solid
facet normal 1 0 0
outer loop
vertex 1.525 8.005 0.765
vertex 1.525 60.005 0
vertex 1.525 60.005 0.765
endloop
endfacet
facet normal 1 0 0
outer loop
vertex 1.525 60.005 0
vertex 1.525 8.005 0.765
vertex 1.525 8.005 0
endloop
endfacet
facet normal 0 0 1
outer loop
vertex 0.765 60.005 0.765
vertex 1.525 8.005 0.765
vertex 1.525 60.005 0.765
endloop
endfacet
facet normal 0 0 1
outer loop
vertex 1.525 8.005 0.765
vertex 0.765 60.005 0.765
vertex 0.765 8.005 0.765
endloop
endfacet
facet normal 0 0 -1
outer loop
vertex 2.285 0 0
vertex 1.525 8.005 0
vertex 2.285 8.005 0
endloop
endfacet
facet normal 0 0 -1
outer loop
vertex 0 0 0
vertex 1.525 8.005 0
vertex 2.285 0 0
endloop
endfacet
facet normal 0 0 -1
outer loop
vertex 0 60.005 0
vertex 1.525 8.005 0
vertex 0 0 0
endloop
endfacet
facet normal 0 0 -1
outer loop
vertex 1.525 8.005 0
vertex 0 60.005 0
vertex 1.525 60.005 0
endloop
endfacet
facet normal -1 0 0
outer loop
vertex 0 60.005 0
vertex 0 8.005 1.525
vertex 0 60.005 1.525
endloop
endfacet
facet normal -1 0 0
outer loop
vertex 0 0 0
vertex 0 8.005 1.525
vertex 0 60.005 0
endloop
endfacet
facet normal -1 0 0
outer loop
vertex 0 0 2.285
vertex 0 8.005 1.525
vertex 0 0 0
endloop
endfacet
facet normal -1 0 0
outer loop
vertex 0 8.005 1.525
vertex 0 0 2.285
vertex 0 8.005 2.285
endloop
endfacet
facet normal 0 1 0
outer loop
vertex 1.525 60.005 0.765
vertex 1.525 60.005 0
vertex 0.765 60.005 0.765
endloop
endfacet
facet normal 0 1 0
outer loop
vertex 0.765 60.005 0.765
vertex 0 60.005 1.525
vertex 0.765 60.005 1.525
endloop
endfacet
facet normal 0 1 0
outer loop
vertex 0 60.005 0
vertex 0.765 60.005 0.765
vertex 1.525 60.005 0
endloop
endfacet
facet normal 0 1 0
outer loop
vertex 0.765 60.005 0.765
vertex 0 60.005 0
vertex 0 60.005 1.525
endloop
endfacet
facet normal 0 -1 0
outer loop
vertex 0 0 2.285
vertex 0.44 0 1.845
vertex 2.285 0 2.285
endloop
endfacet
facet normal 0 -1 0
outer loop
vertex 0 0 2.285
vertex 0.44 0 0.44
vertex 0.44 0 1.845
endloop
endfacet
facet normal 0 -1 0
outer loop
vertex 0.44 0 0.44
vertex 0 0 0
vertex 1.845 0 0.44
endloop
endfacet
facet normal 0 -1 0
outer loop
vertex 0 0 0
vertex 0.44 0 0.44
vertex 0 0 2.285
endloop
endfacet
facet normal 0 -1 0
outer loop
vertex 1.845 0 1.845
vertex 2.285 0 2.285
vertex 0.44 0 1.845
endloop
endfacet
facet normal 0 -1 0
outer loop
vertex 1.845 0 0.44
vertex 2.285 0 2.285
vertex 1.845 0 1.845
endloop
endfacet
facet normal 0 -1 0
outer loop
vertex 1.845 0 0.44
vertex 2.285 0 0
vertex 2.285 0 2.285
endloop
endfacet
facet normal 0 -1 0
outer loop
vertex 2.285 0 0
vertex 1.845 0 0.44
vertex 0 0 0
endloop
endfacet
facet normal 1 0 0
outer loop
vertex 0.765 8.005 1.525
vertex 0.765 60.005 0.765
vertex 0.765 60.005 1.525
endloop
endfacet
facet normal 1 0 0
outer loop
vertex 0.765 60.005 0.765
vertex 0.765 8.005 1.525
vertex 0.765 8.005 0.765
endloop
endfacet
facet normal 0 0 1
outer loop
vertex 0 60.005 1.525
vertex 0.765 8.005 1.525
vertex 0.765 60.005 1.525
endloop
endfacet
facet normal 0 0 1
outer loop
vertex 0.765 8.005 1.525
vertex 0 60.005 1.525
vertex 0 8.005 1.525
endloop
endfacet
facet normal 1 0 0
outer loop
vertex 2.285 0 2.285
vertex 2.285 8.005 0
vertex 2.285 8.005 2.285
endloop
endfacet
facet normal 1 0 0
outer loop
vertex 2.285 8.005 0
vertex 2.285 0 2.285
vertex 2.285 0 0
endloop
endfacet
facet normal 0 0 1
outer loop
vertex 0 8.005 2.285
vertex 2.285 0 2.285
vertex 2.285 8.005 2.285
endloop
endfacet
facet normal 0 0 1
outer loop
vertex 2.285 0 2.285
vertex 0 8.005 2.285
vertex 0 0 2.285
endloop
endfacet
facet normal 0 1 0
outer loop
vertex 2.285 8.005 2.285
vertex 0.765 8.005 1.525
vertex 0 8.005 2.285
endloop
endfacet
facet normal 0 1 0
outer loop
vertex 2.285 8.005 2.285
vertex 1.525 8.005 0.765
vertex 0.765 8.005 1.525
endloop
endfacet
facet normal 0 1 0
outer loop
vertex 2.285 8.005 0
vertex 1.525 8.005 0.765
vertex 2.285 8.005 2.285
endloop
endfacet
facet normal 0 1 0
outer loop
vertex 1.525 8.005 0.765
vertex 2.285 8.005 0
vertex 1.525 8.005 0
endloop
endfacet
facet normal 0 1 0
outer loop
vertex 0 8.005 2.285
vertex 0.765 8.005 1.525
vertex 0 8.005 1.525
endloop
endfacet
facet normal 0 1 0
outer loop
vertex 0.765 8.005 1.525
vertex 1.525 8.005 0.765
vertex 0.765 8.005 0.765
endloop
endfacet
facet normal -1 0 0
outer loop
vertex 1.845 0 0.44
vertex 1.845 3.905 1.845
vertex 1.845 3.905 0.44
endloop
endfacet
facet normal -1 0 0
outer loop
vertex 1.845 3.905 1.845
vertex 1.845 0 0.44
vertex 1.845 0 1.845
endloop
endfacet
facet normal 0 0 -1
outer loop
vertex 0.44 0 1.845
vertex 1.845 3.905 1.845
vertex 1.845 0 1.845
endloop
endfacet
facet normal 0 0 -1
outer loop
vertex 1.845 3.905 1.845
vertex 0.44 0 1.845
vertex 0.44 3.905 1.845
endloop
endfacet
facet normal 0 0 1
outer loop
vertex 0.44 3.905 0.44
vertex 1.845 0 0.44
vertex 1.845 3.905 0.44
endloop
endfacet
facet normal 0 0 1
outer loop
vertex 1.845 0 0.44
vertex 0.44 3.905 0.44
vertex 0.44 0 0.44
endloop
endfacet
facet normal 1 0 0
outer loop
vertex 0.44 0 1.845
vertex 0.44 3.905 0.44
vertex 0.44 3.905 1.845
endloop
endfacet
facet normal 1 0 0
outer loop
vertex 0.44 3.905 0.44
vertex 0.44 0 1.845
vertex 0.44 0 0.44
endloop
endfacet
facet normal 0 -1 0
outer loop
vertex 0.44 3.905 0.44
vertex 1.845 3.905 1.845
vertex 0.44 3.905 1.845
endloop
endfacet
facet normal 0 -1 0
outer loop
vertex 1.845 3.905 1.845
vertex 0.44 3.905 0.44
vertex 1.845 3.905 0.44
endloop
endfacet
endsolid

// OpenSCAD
stem_length = 60;
stem_width = 3.8;
// pixel = 0.85;
pixel = stem_width / 5;

pocket_offset = 0.0;
pocket_length = 8.0;
pocket_width = 1.4;

top_pocket = pocket_length / 2.0;

p0 = 0 * pixel;
p1 = 1 * pixel;
p2 = 2 * pixel;
p3 = 3 * pixel;
p4 = 4 * pixel;

function addv(dims, variance=0.005) = [dims[0]+variance, dims[1]+variance, dims[2]+variance];

difference() {
  union() {
    color([0,1,0]) translate([p0,p0,p0]) cube(addv([p2, stem_length, p1]));
    color([0,0,1]) translate([p0,p0,p1]) cube(addv([p1, stem_length, p1]));

    color([1,0,0]) translate([p0,p0,p0]) cube(addv([p3, pocket_length, p3]));
  }
  translate([p3/2-pocket_width/2,p0-0.1,p3/2-pocket_width/2]) cube(addv([pocket_width, pocket_length/2, pocket_width]));
}

//color([1,1,0]) translate([p2,p0,p0]) cube(addv([p1, pocket_length, p3]));
//color([0,1,1]) translate([p0,p0,p2]) cube(addv([p2, pocket_length, p1]));
